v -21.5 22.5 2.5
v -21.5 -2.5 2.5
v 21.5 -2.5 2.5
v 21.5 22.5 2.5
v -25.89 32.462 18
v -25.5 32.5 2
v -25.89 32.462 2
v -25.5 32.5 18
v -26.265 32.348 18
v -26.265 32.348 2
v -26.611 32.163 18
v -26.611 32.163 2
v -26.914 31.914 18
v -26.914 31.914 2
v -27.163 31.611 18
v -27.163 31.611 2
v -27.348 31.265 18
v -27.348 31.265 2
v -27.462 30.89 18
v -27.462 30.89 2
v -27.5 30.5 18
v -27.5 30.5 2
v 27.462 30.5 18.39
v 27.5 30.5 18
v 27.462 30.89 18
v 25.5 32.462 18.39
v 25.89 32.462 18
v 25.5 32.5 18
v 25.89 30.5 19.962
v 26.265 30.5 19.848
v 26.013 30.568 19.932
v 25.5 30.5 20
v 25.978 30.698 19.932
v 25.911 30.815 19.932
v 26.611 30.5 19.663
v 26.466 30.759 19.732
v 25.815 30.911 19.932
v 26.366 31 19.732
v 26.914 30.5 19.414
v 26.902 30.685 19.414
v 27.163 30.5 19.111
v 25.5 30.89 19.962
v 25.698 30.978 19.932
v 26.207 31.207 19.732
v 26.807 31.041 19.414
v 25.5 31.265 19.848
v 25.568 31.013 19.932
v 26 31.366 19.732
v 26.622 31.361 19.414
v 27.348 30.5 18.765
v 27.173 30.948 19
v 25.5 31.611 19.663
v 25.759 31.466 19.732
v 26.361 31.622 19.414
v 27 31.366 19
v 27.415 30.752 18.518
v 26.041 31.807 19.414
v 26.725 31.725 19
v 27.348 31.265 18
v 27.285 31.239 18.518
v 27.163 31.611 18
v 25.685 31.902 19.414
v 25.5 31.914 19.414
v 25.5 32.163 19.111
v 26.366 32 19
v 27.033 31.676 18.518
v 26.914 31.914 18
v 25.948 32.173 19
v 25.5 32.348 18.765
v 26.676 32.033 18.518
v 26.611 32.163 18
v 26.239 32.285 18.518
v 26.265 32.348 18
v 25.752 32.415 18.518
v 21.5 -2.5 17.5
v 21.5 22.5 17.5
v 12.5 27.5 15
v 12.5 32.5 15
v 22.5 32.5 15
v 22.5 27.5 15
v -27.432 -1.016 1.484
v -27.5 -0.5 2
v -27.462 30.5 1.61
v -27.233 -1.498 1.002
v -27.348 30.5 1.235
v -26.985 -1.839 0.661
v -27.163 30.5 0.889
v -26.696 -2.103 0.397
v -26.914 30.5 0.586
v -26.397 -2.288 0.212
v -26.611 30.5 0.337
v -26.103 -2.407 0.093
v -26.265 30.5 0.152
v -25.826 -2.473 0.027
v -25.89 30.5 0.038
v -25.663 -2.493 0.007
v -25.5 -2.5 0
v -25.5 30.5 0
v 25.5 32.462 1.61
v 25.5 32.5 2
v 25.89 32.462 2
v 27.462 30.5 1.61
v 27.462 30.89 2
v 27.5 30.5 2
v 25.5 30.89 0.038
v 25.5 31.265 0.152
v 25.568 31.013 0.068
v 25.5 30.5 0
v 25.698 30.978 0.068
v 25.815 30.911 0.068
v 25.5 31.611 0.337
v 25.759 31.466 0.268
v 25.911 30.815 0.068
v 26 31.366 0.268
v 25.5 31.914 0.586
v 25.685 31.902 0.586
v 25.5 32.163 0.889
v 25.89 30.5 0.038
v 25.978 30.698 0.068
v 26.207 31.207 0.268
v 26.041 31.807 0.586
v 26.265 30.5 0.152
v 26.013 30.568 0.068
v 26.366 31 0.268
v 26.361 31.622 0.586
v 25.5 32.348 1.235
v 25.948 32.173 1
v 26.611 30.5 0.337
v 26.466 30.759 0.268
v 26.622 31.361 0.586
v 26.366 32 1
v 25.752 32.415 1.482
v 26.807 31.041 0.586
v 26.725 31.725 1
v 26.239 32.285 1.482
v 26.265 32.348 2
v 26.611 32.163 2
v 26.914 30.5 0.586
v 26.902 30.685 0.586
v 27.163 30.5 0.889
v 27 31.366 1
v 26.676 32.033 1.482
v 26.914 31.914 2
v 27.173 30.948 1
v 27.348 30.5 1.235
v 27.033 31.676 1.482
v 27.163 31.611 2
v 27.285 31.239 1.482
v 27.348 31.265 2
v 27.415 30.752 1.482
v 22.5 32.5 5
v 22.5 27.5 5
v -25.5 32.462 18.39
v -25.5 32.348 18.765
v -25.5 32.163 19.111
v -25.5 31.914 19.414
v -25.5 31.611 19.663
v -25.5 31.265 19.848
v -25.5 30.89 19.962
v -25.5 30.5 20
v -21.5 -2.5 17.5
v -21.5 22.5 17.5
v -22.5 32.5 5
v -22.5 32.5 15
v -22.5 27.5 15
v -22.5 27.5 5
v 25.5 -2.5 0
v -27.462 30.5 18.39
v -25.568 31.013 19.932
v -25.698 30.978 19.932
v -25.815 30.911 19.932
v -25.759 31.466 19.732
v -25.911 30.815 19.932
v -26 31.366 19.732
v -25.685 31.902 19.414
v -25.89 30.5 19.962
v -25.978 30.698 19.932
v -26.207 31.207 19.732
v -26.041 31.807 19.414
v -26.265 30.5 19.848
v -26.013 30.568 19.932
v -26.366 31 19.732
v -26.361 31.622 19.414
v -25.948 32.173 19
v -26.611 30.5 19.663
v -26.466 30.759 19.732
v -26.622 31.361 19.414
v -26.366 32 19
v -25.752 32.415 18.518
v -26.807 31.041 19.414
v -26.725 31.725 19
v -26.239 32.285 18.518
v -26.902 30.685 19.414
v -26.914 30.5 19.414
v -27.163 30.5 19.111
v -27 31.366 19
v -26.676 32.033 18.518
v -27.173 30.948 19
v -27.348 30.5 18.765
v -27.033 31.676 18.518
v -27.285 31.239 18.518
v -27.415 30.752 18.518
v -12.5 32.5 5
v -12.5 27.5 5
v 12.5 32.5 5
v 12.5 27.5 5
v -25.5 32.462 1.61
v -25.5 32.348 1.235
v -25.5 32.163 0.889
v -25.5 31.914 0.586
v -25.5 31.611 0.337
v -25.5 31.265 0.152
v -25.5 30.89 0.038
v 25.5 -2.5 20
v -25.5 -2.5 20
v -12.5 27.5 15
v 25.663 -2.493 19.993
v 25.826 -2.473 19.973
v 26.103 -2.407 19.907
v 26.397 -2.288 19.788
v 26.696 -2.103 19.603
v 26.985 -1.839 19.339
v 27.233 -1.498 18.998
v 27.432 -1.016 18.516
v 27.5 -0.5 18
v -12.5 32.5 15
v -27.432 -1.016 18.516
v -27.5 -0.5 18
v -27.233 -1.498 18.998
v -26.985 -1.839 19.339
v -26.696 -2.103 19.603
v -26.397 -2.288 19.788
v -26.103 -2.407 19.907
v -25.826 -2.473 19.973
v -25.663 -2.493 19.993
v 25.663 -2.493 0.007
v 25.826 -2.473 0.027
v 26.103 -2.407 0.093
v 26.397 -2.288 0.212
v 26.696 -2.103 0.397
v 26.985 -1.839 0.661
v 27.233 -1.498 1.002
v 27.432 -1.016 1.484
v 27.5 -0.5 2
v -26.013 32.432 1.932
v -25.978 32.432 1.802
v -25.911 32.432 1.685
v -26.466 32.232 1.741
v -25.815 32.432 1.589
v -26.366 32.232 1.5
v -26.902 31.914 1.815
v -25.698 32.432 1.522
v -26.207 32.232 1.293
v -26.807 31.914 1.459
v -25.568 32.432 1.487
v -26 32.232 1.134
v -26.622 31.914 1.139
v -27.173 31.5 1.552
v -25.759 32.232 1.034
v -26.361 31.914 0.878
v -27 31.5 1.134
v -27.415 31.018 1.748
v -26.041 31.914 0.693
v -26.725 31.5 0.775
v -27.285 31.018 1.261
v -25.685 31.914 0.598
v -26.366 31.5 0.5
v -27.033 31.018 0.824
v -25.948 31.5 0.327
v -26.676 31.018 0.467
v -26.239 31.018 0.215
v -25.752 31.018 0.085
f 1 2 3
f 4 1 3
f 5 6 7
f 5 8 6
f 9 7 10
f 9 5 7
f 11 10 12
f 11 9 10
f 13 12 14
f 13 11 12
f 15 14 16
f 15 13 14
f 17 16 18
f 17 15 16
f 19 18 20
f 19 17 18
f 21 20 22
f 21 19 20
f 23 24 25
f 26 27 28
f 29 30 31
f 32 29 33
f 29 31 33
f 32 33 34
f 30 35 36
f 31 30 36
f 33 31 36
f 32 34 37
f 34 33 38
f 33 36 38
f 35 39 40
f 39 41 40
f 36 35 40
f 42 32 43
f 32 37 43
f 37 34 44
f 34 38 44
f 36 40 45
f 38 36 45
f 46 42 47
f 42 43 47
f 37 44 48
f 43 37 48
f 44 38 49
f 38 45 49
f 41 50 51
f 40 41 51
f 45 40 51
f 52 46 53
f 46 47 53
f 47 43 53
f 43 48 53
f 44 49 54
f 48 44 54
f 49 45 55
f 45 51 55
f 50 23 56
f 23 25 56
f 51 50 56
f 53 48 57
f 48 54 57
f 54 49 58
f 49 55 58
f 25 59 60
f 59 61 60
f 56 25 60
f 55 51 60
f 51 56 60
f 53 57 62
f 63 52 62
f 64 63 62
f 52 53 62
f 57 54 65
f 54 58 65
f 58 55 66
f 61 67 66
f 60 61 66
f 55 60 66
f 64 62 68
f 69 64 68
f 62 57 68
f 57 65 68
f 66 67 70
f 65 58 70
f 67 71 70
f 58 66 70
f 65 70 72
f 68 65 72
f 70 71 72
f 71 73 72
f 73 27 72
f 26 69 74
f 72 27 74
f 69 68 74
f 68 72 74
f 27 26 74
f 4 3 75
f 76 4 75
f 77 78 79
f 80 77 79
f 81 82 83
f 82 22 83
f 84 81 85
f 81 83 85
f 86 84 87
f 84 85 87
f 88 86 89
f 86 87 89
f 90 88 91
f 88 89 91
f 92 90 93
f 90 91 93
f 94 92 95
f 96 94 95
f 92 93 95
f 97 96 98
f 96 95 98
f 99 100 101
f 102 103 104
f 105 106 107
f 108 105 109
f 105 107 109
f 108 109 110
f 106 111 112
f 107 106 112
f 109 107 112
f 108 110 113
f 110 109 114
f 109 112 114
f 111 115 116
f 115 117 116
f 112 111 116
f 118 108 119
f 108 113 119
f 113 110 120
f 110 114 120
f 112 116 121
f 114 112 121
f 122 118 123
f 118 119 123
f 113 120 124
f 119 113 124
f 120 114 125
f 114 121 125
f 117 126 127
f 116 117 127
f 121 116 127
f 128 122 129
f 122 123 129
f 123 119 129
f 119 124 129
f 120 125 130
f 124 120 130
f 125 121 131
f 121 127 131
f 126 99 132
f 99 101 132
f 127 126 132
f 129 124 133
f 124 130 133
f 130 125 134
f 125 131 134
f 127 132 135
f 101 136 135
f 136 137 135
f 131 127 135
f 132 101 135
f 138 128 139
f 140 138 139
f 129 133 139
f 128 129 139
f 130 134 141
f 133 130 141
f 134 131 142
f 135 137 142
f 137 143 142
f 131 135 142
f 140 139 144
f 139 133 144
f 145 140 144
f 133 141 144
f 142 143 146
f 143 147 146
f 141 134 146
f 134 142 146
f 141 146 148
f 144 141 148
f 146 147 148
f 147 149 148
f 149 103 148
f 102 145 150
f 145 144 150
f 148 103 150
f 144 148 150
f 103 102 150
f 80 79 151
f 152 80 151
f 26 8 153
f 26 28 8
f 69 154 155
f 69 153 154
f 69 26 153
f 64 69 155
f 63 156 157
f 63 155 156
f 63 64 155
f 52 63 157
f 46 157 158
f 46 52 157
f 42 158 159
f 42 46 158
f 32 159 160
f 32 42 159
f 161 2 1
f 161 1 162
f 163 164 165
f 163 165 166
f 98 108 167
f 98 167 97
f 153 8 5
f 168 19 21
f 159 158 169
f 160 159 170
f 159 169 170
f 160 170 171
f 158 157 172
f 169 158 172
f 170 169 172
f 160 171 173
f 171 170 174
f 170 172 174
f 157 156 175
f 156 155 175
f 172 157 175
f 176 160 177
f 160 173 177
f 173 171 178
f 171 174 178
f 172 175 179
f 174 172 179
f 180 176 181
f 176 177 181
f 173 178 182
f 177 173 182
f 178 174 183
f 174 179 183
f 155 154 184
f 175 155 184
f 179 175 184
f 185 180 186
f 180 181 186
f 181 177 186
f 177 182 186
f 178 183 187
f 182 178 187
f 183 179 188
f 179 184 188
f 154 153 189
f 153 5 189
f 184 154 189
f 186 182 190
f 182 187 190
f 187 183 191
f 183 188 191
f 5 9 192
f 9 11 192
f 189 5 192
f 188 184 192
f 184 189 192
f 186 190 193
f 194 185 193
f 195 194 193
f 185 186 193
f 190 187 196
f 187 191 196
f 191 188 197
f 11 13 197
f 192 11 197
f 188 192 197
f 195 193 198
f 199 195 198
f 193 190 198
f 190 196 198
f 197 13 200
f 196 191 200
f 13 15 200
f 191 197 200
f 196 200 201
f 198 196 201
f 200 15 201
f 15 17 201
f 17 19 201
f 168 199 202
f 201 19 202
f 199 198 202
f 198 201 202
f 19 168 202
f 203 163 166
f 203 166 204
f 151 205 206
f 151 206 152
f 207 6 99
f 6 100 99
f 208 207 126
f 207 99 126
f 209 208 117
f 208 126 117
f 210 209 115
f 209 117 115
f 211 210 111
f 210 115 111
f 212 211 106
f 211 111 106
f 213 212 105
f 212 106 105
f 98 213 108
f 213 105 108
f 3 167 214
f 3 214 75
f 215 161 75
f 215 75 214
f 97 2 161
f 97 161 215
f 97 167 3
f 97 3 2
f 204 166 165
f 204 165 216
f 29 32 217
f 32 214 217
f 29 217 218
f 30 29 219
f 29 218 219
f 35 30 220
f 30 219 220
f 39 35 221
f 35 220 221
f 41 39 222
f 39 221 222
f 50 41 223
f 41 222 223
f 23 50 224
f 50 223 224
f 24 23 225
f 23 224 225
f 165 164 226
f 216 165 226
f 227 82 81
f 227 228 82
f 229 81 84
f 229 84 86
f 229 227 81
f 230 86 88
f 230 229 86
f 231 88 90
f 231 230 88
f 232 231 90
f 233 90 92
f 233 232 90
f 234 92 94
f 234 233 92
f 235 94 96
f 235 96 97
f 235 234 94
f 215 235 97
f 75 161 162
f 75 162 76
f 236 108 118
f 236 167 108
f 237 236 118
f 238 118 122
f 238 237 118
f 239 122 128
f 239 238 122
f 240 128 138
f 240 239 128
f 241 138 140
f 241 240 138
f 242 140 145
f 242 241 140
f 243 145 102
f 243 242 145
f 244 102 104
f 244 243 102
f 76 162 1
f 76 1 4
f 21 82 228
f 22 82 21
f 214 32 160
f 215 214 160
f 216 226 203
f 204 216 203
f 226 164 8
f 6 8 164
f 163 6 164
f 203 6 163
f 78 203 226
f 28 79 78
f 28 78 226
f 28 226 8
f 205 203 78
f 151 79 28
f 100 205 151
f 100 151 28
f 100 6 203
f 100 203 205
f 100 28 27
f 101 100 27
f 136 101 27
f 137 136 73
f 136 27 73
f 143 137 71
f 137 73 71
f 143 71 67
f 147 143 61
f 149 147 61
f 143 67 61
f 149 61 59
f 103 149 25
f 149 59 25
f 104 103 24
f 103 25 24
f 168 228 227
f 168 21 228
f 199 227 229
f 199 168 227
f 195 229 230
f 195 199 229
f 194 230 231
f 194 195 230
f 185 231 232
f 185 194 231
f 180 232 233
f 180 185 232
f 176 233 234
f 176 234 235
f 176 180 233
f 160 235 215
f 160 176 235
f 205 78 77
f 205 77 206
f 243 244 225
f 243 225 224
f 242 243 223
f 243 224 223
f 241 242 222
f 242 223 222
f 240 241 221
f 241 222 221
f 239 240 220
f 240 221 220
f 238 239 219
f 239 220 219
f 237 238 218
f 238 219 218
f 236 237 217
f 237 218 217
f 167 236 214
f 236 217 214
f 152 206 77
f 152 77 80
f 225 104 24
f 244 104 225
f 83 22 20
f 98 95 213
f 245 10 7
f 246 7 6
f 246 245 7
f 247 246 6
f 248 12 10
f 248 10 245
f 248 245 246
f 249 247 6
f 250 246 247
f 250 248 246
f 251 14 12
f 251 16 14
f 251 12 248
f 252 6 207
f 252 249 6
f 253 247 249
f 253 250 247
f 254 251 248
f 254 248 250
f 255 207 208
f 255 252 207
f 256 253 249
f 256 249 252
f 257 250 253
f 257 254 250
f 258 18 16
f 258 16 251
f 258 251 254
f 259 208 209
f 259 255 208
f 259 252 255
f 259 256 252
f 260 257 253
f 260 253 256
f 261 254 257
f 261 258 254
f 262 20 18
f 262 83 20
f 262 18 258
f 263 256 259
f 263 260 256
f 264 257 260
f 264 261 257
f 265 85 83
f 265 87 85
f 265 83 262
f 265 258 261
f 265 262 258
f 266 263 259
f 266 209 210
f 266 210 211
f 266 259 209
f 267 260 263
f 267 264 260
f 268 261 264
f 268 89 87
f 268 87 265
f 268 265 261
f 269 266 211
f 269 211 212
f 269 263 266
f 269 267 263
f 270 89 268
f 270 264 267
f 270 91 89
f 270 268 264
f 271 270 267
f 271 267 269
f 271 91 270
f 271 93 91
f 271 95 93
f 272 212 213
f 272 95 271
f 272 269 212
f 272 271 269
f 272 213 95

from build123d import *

# Parameters (mm, degrees)
BOSS_EXTRUDE1_DEPTH = 20
SKETCH6_W           = 10
SKETCH6_H           = 10
CUT_EXTRUDE2_DEPTH  = 5
SKETCH7_W           = 10
SKETCH7_H           = 10
CUT_EXTRUDE3_DEPTH  = 5
FILLET1_R           = 2
FILLET2_R           = 2
CUT_EXTRUDE4_DEPTH  = 30
SKETCH9_W           = 43
SKETCH9_H           = 15
CUT_EXTRUDE5_DEPTH  = 25


with BuildPart() as part:
    # Sketch1 → Boss-Extrude1 (new body)
    with BuildSketch(Plane.XY):
        Polygon((-27.5, 32.5), (27.5, 32.5), (27.5, -2.5), (21.5, -2.5), (21.5, -32.5), (-21.5, -32.5), (-21.5, -2.5), (-27.5, -2.5), align=None)
    extrude(amount=BOSS_EXTRUDE1_DEPTH)

    # Sketch6 → Cut-Extrude2 (cut)
    with BuildSketch(Plane(origin=(0, 32.5, 0), x_dir=(1, 0, 0), z_dir=(0, 1, 0))):
        with Locations((-17.5, -10)):
            Rectangle(SKETCH6_W, SKETCH6_H)
        with Locations((17.5, -10)):
            Rectangle(SKETCH6_W, SKETCH6_H)
    extrude(amount=-CUT_EXTRUDE2_DEPTH, mode=Mode.SUBTRACT)

    # Sketch7 → Cut-Extrude3 (cut)
    with BuildSketch(Plane.XZ.offset(32.5)):
        with Locations((-14, 7.5)):
            Rectangle(SKETCH7_W, SKETCH7_H)
        with Locations((14, 7.5)):
            Rectangle(SKETCH7_W, SKETCH7_H)
    extrude(amount=-CUT_EXTRUDE3_DEPTH, mode=Mode.SUBTRACT)

    # Fillet1
    fillet1_edges = [part.edges().sort_by_distance(p)[0] for p in [
        (-21.5, -17.5, 0),
        (-27.5, 15, 0),
        (-27.5, 32.5, 10),
        (27.5, 32.5, 10),
        (27.5, -2.5, 10),
        (-21.5, -32.5, 10),
        (-27.5, -2.5, 10),
        (0, -32.5, 20),
        (21.5, -17.5, 20),
        (27.5, 15, 20),
        (0, 32.5, 20),
        (-27.5, 15, 20),
        (0, 32.5, 0),
        (27.5, 15, 0),
        (21.5, -17.5, 0),
    ]]
    fillet(fillet1_edges, radius=FILLET1_R)

    # Fillet2
    # the kernel refuses this fillet: 2 mm, written as the material it takes off along each edge
    with BuildSketch(Plane(origin=(-19.5, -30.5, 2), x_dir=(0, 0, -1), z_dir=(0, -1, 0))) as fillet2_piece_1_section:
        Polygon((0, 0), (FILLET2_R, 0), (FILLET2_R, -FILLET2_R), (0, -FILLET2_R), align=None)
    fillet2_piece_1 = extrude(amount=FILLET2_R, mode=Mode.PRIVATE)
    fillet2_piece_1 = fillet2_piece_1 - Plane(origin=(-19.5, -30.5, 2), x_dir=(0.7071067811865475, 0, 0.7071067811865475), z_dir=(0, -1, 0)) * Sphere(FILLET2_R, mode=Mode.PRIVATE)
    add(fillet2_piece_1, mode=Mode.SUBTRACT)
    with BuildSketch(Plane(origin=(19.5, -30.5, 18), x_dir=(1, 0, 0), z_dir=(0, -1, 0))) as fillet2_piece_2_section:
        Polygon((0, 0), (FILLET2_R, 0), (FILLET2_R, FILLET2_R), (0, FILLET2_R), align=None)
    fillet2_piece_2 = extrude(amount=FILLET2_R, mode=Mode.PRIVATE)
    fillet2_piece_2 = fillet2_piece_2 - Plane(origin=(19.5, -30.5, 18), x_dir=(-0.7071067811865475, 0, -0.7071067811865475), z_dir=(0, -1, 0)) * Sphere(FILLET2_R, mode=Mode.PRIVATE)
    add(fillet2_piece_2, mode=Mode.SUBTRACT)
    with BuildSketch(Plane(origin=(21.5, -32.5, 2), x_dir=(-1, 0, 0), z_dir=(0, 0, 1))) as fillet2_piece_3:
        with BuildLine():
            CenterArc((FILLET2_R, -FILLET2_R), FILLET2_R, 90, 90)
            Line((0, -FILLET2_R), (0, 0))
            Line((0, 0), (FILLET2_R, 0))
        make_face()
    extrude(amount=16, mode=Mode.SUBTRACT)
    with BuildSketch(Plane(origin=(19.5, -32.5, 0), x_dir=(0, 0, 1), z_dir=(-1, 0, 0))) as fillet2_piece_4:
        with BuildLine():
            CenterArc((FILLET2_R, FILLET2_R), FILLET2_R, 180, 90)
            Line((0, FILLET2_R), (0, 0))
            Line((0, 0), (FILLET2_R, 0))
        make_face()
    extrude(amount=39, mode=Mode.SUBTRACT)
    with BuildSketch(Plane(origin=(19.5, -32.5, 2), x_dir=(0, 0, -1), z_dir=(-1, 0, 0))) as fillet2_piece_5:
        with BuildLine():
            CenterArc((2 - FILLET2_R, -FILLET2_R), FILLET2_R, 360, 90)
            Line((2, -FILLET2_R), (2, 0))
            Line((2, 0), (2 - FILLET2_R, 0))
        make_face()
    revolve(axis=Axis((19.5, -32.5, 2), (0, -1, 0)), revolution_arc=90, mode=Mode.SUBTRACT)

    # Sketch8 → Cut-Extrude4 (cut)
    with BuildSketch(Plane(origin=(0, -2.5, 0), x_dir=(-1, 0, 0), z_dir=(0, -1, 0))):
        Polygon((-23.544279595, 2.278765761), (24.281911255, 2.554989635), (24.437245142, -24.339963353), (-23.544279595, -24.339963353), align=None)
    extrude(amount=CUT_EXTRUDE4_DEPTH, mode=Mode.SUBTRACT)

    # Sketch9 → Cut-Extrude5 (cut)
    with BuildSketch(Plane.XZ.offset(2.5)):
        with Locations((0, 10)):
            Rectangle(SKETCH9_W, SKETCH9_H)
    extrude(amount=-CUT_EXTRUDE5_DEPTH, mode=Mode.SUBTRACT)


solid = part.part
